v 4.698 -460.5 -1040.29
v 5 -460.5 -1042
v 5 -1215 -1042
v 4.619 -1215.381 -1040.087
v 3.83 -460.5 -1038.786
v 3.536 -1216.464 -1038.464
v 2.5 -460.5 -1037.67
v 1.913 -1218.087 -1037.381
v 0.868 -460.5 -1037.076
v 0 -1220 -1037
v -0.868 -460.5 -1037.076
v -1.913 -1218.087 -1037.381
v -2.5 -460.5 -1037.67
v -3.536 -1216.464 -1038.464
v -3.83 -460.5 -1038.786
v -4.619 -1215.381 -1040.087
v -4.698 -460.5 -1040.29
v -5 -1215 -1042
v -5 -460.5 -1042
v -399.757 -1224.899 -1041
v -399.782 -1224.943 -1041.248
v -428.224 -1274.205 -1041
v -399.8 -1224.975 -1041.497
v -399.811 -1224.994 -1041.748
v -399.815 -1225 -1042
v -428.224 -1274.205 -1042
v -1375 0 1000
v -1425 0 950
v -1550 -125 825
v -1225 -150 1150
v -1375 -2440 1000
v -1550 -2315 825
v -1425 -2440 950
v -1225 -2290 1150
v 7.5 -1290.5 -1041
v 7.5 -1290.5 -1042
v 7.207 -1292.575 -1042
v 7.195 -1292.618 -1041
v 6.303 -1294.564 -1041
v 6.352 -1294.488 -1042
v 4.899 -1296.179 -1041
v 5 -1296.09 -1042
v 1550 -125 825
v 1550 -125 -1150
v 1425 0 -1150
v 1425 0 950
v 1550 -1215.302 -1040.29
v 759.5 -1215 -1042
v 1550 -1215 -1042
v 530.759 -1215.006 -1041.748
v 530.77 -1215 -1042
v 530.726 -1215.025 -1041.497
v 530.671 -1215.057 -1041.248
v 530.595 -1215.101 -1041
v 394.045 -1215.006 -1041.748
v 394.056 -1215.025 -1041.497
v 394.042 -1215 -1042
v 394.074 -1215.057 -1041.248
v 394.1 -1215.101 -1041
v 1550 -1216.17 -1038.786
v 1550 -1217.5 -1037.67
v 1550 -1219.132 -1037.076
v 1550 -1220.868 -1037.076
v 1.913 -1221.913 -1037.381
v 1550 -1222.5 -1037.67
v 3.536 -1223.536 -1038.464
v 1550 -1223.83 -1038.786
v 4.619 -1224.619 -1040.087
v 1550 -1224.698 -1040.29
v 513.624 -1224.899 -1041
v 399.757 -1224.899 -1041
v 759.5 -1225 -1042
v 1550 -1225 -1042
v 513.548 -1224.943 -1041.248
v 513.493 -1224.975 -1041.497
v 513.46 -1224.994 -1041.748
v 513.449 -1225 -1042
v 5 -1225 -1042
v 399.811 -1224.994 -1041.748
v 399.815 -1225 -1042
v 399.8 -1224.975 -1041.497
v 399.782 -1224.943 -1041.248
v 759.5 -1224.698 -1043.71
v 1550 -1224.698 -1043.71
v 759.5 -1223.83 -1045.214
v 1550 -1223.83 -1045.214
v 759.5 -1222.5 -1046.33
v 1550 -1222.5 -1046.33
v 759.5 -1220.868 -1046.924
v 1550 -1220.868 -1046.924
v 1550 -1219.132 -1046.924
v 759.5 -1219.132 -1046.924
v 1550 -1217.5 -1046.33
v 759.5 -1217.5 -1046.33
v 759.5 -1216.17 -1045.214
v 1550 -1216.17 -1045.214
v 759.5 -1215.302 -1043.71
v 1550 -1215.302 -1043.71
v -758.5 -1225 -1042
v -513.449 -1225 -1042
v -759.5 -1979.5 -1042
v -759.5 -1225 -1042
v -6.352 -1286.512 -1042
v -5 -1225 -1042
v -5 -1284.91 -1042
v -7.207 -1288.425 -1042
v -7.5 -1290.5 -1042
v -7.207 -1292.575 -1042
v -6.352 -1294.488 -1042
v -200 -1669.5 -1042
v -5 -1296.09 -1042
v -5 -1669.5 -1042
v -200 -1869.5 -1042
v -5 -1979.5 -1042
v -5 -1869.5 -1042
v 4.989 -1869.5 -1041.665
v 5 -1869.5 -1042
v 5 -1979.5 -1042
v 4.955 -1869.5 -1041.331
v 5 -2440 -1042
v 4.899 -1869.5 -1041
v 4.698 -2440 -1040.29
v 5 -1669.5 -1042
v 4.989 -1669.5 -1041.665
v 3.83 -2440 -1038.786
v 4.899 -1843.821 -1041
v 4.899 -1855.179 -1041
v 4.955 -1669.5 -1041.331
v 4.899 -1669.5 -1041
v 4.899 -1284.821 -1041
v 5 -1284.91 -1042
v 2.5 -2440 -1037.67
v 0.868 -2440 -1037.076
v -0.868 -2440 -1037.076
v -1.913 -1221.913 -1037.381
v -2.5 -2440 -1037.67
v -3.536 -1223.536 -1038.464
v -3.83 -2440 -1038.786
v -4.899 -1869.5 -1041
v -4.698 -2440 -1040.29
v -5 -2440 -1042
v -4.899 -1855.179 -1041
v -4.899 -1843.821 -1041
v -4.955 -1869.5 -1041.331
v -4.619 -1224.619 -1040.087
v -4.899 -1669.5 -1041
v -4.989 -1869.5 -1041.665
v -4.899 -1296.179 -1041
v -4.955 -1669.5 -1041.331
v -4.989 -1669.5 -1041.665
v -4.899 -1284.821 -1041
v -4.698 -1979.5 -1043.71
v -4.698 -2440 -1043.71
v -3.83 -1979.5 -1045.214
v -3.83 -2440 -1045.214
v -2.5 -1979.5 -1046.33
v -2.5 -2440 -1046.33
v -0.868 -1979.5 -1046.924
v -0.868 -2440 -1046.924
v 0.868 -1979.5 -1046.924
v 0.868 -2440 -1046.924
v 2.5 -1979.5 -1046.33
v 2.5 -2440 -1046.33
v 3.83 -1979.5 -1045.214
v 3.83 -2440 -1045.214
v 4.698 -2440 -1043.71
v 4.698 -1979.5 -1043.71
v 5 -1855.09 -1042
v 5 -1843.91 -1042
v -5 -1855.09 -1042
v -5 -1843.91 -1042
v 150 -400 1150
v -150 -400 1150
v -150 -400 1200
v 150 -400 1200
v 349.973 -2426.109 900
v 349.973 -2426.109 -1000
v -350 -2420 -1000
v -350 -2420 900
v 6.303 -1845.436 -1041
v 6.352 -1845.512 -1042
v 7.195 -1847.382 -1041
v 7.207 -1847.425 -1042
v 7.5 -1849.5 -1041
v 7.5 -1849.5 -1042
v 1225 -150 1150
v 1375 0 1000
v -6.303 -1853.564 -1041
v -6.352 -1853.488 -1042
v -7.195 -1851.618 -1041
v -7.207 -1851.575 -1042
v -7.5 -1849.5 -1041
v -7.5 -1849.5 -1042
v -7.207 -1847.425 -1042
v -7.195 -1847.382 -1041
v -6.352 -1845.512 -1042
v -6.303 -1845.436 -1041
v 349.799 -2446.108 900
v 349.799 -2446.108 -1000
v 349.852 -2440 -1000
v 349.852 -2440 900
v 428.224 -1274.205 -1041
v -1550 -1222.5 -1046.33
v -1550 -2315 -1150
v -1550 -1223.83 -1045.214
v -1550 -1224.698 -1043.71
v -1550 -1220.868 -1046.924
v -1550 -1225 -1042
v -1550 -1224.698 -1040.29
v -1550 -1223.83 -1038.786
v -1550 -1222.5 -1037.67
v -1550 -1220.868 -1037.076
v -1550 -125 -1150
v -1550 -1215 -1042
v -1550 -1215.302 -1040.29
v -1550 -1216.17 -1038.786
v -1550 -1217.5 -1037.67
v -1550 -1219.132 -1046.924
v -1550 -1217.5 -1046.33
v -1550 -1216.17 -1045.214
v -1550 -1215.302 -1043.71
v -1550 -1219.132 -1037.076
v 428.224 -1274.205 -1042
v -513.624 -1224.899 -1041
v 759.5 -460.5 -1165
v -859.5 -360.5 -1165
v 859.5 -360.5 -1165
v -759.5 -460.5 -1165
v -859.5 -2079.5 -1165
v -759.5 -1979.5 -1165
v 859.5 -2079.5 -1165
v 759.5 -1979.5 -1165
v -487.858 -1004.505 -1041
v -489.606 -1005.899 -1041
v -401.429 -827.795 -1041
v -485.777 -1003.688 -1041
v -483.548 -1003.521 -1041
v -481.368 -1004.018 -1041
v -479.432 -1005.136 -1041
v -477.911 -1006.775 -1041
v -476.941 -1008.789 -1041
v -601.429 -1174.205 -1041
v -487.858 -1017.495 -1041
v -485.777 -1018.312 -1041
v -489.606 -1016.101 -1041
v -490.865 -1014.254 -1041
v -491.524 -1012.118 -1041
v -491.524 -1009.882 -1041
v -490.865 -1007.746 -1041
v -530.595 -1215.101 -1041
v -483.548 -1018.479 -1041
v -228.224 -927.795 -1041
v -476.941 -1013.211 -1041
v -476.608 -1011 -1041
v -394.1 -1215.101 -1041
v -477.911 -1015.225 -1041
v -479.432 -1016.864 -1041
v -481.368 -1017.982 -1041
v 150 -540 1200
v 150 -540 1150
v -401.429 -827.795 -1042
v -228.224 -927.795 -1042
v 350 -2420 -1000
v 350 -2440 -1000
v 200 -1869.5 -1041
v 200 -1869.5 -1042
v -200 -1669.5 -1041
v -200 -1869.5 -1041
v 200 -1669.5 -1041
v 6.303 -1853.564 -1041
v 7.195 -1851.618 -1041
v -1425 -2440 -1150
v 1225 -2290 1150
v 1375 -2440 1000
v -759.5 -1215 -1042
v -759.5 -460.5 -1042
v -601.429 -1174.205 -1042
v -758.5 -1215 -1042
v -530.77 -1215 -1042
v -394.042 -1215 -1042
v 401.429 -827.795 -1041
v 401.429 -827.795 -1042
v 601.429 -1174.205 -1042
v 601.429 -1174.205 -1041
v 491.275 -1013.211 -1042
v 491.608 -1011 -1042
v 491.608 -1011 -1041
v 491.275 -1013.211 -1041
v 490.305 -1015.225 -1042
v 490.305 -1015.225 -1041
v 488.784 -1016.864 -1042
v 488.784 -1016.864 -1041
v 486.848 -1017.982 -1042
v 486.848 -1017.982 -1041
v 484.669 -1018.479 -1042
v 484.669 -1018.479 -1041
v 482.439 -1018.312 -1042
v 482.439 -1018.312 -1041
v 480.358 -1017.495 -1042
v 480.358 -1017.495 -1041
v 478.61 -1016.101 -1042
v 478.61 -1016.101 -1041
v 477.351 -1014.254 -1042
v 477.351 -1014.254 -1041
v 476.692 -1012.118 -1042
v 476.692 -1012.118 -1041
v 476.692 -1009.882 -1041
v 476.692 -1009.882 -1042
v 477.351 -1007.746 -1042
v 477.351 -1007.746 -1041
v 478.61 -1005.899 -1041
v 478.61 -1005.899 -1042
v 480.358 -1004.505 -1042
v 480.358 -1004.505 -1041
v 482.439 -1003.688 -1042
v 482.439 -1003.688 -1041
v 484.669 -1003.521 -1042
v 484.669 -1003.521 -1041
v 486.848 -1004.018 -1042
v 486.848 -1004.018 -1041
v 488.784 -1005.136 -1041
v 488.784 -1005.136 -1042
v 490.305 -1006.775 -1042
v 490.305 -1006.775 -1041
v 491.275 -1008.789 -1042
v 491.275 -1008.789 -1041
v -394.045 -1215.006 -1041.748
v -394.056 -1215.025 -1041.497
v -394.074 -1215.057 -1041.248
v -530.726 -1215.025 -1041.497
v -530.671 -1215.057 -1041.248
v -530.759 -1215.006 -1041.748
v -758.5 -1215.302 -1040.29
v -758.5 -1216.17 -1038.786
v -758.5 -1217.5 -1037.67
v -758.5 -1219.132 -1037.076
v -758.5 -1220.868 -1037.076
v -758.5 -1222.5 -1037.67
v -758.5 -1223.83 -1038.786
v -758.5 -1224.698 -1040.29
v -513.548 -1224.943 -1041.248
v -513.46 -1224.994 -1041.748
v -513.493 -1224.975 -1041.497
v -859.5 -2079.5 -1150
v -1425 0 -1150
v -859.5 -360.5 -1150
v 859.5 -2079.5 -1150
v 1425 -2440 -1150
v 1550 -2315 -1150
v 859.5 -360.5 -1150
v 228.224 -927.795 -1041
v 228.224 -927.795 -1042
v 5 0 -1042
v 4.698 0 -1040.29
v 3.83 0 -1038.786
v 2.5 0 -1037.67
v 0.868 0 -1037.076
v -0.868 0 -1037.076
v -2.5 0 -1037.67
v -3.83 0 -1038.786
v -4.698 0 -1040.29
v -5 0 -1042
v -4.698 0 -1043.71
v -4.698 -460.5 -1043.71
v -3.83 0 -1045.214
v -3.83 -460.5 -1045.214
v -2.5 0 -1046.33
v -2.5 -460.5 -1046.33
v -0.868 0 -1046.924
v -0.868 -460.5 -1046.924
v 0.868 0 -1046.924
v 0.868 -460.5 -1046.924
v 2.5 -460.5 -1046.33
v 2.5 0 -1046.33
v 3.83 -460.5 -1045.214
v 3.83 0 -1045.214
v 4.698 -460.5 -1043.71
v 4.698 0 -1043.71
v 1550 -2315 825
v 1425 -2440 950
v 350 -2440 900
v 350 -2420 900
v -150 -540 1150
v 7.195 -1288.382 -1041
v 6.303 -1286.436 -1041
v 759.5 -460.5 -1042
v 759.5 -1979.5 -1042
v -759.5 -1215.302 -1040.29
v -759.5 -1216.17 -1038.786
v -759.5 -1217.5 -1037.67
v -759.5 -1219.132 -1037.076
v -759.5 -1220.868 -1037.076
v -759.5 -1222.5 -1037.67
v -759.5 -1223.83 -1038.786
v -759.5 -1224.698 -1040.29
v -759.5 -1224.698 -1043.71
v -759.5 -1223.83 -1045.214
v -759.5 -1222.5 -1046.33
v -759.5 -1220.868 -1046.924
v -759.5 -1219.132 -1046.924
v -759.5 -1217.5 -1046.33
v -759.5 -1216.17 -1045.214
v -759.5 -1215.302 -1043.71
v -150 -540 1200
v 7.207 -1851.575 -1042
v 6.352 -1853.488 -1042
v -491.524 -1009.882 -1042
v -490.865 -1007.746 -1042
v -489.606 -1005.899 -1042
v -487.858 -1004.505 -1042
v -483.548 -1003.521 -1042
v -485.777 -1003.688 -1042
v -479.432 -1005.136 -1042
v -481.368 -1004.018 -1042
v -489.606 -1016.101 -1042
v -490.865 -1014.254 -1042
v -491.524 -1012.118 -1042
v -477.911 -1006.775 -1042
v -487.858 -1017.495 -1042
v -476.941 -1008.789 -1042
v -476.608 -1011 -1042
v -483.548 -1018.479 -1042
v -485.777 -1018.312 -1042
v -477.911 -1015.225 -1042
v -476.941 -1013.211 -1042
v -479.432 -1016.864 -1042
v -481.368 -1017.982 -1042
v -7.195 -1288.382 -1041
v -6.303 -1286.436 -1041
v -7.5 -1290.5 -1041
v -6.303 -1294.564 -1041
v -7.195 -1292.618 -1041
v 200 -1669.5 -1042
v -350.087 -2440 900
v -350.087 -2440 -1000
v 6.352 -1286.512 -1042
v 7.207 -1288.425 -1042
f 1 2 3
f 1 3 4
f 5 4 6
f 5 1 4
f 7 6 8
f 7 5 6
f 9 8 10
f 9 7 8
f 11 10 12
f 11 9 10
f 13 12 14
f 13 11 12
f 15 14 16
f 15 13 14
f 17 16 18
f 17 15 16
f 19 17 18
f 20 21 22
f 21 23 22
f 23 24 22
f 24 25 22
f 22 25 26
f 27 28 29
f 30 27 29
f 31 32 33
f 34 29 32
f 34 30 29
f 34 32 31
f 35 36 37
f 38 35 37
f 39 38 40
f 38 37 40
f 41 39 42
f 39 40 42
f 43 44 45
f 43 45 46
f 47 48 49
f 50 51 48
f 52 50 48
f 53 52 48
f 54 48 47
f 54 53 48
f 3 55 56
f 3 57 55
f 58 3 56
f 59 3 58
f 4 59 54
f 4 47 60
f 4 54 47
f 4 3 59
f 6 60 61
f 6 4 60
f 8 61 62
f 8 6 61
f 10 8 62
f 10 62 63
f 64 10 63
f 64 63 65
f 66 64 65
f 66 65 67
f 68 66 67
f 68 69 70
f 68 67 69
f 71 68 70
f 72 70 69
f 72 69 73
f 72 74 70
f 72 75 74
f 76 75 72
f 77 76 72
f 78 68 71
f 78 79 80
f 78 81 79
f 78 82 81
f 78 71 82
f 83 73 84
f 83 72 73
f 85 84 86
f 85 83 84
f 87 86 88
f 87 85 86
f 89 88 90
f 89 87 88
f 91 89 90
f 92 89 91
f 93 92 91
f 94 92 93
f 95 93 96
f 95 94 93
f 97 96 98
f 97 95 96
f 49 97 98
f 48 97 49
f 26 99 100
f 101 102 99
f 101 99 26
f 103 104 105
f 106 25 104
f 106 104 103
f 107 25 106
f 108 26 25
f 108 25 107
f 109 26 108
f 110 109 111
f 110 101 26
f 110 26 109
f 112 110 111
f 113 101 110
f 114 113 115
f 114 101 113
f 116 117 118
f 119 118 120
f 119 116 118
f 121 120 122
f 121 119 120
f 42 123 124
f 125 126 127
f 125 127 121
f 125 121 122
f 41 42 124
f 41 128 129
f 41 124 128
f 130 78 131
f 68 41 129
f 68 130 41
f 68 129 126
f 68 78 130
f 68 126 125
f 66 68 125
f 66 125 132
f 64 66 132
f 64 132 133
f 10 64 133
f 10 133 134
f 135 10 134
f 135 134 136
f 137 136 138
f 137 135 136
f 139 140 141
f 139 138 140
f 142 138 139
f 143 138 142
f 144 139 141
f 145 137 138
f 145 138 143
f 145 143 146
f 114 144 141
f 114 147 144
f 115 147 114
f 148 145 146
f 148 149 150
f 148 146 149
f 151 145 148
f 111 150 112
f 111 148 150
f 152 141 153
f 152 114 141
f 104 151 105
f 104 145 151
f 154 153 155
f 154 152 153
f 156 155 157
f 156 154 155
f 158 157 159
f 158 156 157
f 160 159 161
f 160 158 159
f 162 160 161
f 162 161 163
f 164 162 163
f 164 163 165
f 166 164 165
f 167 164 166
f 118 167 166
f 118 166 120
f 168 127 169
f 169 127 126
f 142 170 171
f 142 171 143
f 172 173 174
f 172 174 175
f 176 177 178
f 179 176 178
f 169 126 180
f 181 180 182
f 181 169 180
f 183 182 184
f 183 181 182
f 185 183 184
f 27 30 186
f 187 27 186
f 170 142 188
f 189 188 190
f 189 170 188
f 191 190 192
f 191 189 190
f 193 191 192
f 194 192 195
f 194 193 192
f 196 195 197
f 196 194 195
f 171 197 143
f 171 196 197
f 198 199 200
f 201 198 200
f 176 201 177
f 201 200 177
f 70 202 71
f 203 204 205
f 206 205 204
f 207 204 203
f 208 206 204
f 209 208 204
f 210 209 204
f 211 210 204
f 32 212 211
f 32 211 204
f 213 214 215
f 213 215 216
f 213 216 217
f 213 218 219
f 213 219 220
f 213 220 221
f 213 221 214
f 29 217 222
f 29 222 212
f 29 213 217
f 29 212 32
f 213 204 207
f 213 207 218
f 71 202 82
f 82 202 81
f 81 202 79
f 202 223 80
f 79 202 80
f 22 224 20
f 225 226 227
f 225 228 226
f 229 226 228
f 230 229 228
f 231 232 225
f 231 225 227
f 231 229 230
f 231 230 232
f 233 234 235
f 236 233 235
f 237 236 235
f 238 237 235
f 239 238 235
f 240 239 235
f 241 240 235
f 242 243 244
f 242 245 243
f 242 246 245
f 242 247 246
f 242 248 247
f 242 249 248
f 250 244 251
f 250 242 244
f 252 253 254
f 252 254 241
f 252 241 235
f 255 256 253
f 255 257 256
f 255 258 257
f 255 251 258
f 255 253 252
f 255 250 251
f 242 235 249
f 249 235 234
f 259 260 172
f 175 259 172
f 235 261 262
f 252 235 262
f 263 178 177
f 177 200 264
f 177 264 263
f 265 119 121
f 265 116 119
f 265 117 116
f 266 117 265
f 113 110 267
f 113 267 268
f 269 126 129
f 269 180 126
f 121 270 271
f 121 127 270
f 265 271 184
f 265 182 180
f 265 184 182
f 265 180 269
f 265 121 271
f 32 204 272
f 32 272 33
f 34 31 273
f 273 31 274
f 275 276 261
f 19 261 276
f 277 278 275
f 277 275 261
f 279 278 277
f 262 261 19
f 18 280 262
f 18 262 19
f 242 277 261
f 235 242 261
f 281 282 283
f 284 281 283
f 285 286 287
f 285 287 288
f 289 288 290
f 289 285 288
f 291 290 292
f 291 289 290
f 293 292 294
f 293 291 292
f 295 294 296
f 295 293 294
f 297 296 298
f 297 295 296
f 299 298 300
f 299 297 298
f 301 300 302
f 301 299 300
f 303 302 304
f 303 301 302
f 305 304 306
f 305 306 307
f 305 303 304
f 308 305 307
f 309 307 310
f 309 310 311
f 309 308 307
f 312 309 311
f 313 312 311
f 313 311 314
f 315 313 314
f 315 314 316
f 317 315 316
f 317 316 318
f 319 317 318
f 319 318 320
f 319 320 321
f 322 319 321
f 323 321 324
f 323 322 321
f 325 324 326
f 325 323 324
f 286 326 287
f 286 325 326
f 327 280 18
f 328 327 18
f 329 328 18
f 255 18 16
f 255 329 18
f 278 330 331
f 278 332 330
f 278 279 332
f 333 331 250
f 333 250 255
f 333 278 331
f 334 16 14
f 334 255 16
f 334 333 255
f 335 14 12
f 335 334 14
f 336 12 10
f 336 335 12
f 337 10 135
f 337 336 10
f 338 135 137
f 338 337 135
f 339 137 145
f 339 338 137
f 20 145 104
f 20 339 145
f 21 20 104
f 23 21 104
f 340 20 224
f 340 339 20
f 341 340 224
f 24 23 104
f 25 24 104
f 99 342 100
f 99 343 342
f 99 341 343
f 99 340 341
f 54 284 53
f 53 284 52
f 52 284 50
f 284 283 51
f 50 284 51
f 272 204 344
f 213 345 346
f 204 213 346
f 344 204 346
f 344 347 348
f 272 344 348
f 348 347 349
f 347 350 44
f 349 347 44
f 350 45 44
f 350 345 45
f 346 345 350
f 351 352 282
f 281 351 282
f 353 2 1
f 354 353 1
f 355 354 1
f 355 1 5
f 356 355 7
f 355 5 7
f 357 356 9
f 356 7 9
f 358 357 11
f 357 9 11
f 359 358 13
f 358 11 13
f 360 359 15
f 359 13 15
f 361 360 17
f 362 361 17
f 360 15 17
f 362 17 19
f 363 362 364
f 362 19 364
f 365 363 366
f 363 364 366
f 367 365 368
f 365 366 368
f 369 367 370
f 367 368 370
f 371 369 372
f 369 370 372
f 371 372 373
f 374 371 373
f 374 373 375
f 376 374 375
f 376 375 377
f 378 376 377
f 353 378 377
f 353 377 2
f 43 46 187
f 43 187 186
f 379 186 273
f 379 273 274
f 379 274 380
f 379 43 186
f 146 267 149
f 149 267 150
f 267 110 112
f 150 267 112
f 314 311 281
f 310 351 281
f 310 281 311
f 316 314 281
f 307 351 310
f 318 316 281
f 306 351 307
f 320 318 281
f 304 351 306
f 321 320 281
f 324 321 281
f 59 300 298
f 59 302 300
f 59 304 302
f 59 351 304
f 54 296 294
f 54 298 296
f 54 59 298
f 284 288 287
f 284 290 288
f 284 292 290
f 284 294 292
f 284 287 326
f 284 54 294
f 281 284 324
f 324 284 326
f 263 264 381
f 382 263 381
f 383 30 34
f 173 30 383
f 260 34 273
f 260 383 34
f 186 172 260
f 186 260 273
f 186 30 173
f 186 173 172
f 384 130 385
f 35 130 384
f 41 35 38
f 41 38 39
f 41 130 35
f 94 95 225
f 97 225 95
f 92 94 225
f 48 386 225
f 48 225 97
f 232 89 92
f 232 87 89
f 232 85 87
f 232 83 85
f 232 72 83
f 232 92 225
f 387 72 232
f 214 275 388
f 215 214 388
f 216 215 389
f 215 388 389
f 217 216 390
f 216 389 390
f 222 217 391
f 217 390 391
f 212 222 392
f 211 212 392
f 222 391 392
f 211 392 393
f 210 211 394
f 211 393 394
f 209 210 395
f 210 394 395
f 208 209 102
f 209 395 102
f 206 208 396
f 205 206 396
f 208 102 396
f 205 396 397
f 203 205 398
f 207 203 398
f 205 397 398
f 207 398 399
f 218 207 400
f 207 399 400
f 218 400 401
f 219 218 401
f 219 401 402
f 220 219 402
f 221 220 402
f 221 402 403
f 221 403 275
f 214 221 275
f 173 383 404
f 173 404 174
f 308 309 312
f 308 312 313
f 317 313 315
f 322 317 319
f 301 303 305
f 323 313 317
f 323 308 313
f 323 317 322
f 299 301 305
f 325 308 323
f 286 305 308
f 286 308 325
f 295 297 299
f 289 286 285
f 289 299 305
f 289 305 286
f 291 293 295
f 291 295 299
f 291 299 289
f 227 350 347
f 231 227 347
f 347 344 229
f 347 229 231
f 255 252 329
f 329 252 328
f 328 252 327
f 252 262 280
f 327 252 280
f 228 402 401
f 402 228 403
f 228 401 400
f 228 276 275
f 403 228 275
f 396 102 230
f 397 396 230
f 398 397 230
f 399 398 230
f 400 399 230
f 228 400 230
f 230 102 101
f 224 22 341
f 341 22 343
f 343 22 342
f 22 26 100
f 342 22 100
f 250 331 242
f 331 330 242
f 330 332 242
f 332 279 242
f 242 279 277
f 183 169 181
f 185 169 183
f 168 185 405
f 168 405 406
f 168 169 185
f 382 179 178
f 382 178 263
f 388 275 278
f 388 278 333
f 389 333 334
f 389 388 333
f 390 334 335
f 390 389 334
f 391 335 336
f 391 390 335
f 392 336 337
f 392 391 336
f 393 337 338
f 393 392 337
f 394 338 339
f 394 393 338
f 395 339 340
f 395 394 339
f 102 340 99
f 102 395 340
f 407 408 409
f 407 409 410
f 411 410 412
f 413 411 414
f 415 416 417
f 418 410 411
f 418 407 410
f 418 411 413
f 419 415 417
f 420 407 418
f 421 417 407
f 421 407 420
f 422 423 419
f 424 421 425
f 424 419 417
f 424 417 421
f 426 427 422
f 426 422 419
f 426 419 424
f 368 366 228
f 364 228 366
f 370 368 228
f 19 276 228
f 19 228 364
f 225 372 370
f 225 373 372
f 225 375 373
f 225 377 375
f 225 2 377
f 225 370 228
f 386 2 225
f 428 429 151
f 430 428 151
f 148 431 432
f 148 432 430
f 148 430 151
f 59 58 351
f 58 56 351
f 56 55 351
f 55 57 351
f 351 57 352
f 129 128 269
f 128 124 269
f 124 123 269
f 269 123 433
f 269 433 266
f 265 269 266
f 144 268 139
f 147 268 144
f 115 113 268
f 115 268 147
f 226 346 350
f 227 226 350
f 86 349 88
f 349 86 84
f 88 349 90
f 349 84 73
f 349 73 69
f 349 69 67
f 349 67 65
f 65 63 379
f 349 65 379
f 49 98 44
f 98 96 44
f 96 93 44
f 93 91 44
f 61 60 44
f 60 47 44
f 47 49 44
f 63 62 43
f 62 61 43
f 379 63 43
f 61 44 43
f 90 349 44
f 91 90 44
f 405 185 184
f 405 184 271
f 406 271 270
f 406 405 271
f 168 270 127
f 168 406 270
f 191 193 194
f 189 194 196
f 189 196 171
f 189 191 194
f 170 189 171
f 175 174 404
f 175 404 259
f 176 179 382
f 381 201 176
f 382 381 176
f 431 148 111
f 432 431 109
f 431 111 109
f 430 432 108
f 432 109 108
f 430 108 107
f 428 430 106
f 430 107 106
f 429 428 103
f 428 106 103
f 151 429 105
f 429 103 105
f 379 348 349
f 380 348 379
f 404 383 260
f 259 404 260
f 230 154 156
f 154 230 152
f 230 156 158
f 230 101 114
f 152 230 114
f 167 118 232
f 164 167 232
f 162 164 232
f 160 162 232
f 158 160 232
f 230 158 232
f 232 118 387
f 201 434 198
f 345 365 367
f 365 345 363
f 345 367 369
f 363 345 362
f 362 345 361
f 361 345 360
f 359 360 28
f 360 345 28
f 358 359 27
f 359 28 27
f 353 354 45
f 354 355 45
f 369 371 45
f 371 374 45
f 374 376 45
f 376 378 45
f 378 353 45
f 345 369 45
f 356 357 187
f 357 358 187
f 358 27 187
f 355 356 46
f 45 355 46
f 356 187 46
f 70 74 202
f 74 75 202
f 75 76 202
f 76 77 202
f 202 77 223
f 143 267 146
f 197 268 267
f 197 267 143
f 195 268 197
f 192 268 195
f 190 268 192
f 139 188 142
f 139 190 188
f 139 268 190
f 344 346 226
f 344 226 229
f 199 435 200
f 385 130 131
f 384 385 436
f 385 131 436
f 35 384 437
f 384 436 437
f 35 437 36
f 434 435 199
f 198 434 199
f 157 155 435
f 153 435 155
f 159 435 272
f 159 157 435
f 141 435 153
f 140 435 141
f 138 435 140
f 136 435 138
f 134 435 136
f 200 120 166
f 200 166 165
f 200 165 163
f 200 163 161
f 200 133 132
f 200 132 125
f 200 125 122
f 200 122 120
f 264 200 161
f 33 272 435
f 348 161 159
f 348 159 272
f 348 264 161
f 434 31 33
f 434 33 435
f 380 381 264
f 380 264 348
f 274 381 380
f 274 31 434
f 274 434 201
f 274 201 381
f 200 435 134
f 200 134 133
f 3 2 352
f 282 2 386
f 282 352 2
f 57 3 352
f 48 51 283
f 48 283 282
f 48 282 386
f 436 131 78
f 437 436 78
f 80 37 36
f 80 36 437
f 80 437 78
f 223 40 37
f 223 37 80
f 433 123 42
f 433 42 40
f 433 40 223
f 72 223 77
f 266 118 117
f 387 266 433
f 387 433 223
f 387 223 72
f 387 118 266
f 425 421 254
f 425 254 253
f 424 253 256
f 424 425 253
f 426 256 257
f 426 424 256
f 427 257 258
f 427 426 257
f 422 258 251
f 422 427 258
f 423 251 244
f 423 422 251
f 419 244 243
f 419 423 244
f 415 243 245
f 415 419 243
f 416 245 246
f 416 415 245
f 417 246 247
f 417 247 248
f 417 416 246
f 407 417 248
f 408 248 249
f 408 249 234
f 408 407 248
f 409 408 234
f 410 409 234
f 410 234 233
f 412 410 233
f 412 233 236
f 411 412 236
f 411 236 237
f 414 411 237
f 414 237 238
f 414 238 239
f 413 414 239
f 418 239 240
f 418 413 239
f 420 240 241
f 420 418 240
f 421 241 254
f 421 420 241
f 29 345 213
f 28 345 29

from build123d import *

# Parameters (mm, degrees)
F0_W           = 3100
F0_H           = 2300
F1_DEPTH       = 2440
F2_SIZE        = 325
F3_SIZE        = 325
F4_SIZE        = 125
F5_SIZE        = 125
F6_SIZE        = 125
F7_SIZE        = 125
F8_W           = 1519
F8_H           = 1519
F9_DEPTH       = 108
F10_W          = 400
F10_H          = 200
F10_R          = 7.5
F11_DEPTH      = 1
F12_R          = 5
F13_DEPTH      = 1
F14_DEPTH      = 790.501
F14_DEPTH_BACK = 2309.501
F15_R          = 5
F16_DEPTH      = 460.501
F16_DEPTH_BACK = 1979.501
F17_SIZE       = 150
F18_SIZE       = 150
F19_W          = 1719
F19_H          = 1719
F19_W_2        = 1519
F19_H_2        = 1519
F20_DEPTH      = 15
F21_W          = 700
F21_H          = 1900
F22_DEPTH      = 20
F23_W          = 300
F23_H          = 140
F24_DEPTH      = 50
F26_DEPTH      = 1900


# Not quite as in the source:
# - a feature of the source that left no trace in its solid (it failed there, or was rolled back) is left out


with BuildPart() as f1:
    # F0 (on Front) → F1 (new body)
    with BuildSketch(Plane.XZ):
        Rectangle(F0_W, F0_H)
    extrude(amount=F1_DEPTH)

    # F2
    f2_edges = [f1.edges().sort_by_distance(p)[0] for p in [
        (-1550, -1220, 1150),
    ]]
    chamfer(f2_edges, length=F2_SIZE)

    # F3
    f3_edges = [f1.edges().sort_by_distance(p)[0] for p in [
        (1550, -1220, 1150),
    ]]
    chamfer(f3_edges, length=F3_SIZE)

    # F4
    f4_edges = [f1.edges().sort_by_distance(p)[0] for p in [
        (1550, -2440, -162.5),
    ]]
    chamfer(f4_edges, length=F4_SIZE)

    # F5
    f5_edges = [f1.edges().sort_by_distance(p)[0] for p in [
        (-1550, -2440, -162.5),
    ]]
    chamfer(f5_edges, length=F5_SIZE)

    # F6
    f6_edges = [f1.edges().sort_by_distance(p)[0] for p in [
        (-1550, 0, -162.5),
    ]]
    chamfer(f6_edges, length=F6_SIZE)

    # F7
    f7_edges = [f1.edges().sort_by_distance(p)[0] for p in [
        (1550, 0, -162.5),
    ]]
    chamfer(f7_edges, length=F7_SIZE)

    # F8 (on face) → F9 (cut)
    with BuildSketch(Plane(origin=(0, 0, -1150), x_dir=(1, 0, 0), z_dir=(0, 0, -1))):
        with Locations((0, 1220)):
            Rectangle(F8_W, F8_H)
    extrude(amount=-F9_DEPTH, mode=Mode.SUBTRACT)

    # F10 (on face) → F11 (cut)
    with BuildSketch(Plane(origin=(0, 0, -1042), x_dir=(1, 0, 0), z_dir=(0, 0, -1))):
        with Locations((0, 1769.5)):
            Rectangle(F10_W, F10_H)
        with Locations((0, 1849.5)):
            Circle(F10_R, mode=Mode.SUBTRACT)
        Polygon((601.4287087912, 1174.2050807569), (428.2236280343, 1274.2050807569), (228.2236280343, 927.7949192431), (401.4287087912, 827.7949192431), align=None)
        with Locations((484.1082007155, 1011)):
            Circle(F10_R, mode=Mode.SUBTRACT)
        Polygon((-228.2236280343, 927.7949192431), (-428.2236280343, 1274.2050807569), (-601.4287087912, 1174.2050807569), (-401.4287087912, 827.7949192431), align=None)
        with Locations((-484.1082007155, 1011)):
            Circle(F10_R, mode=Mode.SUBTRACT)
        with Locations((0, 1290.5)):
            Circle(F10_R)
    extrude(amount=-F11_DEPTH, mode=Mode.SUBTRACT)

    # F12 (on face) → F13 (cut)
    with BuildSketch(Plane.YZ.offset(-759.5)):
        with Locations((-1220, -1042)):
            Circle(F12_R)
    extrude(amount=F13_DEPTH, mode=Mode.SUBTRACT)

    # F12 (on face) → F14 (cut, two sides)
    with BuildSketch(Plane.YZ.offset(-759.5)) as f14_sk:
        with Locations((-1220, -1042)):
            Circle(F12_R)
    extrude(amount=-F14_DEPTH, mode=Mode.SUBTRACT)
    extrude(f14_sk.sketch, amount=F14_DEPTH_BACK, mode=Mode.SUBTRACT)

    # F15 (on face) → F16 (cut, two sides)
    with BuildSketch(Plane.XZ.offset(460.5)) as f16_sk:
        with Locations((0, -1042)):
            Circle(F15_R)
    extrude(amount=-F16_DEPTH, mode=Mode.SUBTRACT)
    extrude(f16_sk.sketch, amount=F16_DEPTH_BACK, mode=Mode.SUBTRACT)

    # F17
    f17_edges = [f1.edges().sort_by_distance(p)[0] for p in [
        (0, 0, 1150),
    ]]
    chamfer(f17_edges, length=F17_SIZE)

    # F18
    f18_edges = [f1.edges().sort_by_distance(p)[0] for p in [
        (0, -2440, 1150),
    ]]
    chamfer(f18_edges, length=F18_SIZE)

    # F19 (on face) → F20 (join)
    with BuildSketch(Plane(origin=(0, 0, -1150), x_dir=(1, 0, 0), z_dir=(0, 0, -1))):
        with Locations((0, 1220)):
            Rectangle(F19_W, F19_H)
        with Locations((0, 1220)):
            Rectangle(F19_W_2, F19_H_2, mode=Mode.SUBTRACT)
    extrude(amount=F20_DEPTH)

    # F21 (on face) → F22 (cut)
    with BuildSketch(Plane.XZ.offset(2440)):
        with Locations((0, -50)):
            Rectangle(F21_W, F21_H)
    extrude(amount=-F22_DEPTH, mode=Mode.SUBTRACT)

    # F23 (on face) → F24 (join)
    with BuildSketch(Plane.XY.offset(1150)):
        with Locations((0, -470)):
            Rectangle(F23_W, F23_H)
    extrude(amount=F24_DEPTH)

    # F25 (on face) → F26 (join)
    with BuildSketch(Plane.XY.offset(-1000)):
        Polygon((-350, -2420), (-350.17453071, -2439.9992384613), (349.798815435, -2446.1078133101), (349.9733461449, -2426.1085748489), align=None)
    extrude(amount=F26_DEPTH)


solid = f1.part
